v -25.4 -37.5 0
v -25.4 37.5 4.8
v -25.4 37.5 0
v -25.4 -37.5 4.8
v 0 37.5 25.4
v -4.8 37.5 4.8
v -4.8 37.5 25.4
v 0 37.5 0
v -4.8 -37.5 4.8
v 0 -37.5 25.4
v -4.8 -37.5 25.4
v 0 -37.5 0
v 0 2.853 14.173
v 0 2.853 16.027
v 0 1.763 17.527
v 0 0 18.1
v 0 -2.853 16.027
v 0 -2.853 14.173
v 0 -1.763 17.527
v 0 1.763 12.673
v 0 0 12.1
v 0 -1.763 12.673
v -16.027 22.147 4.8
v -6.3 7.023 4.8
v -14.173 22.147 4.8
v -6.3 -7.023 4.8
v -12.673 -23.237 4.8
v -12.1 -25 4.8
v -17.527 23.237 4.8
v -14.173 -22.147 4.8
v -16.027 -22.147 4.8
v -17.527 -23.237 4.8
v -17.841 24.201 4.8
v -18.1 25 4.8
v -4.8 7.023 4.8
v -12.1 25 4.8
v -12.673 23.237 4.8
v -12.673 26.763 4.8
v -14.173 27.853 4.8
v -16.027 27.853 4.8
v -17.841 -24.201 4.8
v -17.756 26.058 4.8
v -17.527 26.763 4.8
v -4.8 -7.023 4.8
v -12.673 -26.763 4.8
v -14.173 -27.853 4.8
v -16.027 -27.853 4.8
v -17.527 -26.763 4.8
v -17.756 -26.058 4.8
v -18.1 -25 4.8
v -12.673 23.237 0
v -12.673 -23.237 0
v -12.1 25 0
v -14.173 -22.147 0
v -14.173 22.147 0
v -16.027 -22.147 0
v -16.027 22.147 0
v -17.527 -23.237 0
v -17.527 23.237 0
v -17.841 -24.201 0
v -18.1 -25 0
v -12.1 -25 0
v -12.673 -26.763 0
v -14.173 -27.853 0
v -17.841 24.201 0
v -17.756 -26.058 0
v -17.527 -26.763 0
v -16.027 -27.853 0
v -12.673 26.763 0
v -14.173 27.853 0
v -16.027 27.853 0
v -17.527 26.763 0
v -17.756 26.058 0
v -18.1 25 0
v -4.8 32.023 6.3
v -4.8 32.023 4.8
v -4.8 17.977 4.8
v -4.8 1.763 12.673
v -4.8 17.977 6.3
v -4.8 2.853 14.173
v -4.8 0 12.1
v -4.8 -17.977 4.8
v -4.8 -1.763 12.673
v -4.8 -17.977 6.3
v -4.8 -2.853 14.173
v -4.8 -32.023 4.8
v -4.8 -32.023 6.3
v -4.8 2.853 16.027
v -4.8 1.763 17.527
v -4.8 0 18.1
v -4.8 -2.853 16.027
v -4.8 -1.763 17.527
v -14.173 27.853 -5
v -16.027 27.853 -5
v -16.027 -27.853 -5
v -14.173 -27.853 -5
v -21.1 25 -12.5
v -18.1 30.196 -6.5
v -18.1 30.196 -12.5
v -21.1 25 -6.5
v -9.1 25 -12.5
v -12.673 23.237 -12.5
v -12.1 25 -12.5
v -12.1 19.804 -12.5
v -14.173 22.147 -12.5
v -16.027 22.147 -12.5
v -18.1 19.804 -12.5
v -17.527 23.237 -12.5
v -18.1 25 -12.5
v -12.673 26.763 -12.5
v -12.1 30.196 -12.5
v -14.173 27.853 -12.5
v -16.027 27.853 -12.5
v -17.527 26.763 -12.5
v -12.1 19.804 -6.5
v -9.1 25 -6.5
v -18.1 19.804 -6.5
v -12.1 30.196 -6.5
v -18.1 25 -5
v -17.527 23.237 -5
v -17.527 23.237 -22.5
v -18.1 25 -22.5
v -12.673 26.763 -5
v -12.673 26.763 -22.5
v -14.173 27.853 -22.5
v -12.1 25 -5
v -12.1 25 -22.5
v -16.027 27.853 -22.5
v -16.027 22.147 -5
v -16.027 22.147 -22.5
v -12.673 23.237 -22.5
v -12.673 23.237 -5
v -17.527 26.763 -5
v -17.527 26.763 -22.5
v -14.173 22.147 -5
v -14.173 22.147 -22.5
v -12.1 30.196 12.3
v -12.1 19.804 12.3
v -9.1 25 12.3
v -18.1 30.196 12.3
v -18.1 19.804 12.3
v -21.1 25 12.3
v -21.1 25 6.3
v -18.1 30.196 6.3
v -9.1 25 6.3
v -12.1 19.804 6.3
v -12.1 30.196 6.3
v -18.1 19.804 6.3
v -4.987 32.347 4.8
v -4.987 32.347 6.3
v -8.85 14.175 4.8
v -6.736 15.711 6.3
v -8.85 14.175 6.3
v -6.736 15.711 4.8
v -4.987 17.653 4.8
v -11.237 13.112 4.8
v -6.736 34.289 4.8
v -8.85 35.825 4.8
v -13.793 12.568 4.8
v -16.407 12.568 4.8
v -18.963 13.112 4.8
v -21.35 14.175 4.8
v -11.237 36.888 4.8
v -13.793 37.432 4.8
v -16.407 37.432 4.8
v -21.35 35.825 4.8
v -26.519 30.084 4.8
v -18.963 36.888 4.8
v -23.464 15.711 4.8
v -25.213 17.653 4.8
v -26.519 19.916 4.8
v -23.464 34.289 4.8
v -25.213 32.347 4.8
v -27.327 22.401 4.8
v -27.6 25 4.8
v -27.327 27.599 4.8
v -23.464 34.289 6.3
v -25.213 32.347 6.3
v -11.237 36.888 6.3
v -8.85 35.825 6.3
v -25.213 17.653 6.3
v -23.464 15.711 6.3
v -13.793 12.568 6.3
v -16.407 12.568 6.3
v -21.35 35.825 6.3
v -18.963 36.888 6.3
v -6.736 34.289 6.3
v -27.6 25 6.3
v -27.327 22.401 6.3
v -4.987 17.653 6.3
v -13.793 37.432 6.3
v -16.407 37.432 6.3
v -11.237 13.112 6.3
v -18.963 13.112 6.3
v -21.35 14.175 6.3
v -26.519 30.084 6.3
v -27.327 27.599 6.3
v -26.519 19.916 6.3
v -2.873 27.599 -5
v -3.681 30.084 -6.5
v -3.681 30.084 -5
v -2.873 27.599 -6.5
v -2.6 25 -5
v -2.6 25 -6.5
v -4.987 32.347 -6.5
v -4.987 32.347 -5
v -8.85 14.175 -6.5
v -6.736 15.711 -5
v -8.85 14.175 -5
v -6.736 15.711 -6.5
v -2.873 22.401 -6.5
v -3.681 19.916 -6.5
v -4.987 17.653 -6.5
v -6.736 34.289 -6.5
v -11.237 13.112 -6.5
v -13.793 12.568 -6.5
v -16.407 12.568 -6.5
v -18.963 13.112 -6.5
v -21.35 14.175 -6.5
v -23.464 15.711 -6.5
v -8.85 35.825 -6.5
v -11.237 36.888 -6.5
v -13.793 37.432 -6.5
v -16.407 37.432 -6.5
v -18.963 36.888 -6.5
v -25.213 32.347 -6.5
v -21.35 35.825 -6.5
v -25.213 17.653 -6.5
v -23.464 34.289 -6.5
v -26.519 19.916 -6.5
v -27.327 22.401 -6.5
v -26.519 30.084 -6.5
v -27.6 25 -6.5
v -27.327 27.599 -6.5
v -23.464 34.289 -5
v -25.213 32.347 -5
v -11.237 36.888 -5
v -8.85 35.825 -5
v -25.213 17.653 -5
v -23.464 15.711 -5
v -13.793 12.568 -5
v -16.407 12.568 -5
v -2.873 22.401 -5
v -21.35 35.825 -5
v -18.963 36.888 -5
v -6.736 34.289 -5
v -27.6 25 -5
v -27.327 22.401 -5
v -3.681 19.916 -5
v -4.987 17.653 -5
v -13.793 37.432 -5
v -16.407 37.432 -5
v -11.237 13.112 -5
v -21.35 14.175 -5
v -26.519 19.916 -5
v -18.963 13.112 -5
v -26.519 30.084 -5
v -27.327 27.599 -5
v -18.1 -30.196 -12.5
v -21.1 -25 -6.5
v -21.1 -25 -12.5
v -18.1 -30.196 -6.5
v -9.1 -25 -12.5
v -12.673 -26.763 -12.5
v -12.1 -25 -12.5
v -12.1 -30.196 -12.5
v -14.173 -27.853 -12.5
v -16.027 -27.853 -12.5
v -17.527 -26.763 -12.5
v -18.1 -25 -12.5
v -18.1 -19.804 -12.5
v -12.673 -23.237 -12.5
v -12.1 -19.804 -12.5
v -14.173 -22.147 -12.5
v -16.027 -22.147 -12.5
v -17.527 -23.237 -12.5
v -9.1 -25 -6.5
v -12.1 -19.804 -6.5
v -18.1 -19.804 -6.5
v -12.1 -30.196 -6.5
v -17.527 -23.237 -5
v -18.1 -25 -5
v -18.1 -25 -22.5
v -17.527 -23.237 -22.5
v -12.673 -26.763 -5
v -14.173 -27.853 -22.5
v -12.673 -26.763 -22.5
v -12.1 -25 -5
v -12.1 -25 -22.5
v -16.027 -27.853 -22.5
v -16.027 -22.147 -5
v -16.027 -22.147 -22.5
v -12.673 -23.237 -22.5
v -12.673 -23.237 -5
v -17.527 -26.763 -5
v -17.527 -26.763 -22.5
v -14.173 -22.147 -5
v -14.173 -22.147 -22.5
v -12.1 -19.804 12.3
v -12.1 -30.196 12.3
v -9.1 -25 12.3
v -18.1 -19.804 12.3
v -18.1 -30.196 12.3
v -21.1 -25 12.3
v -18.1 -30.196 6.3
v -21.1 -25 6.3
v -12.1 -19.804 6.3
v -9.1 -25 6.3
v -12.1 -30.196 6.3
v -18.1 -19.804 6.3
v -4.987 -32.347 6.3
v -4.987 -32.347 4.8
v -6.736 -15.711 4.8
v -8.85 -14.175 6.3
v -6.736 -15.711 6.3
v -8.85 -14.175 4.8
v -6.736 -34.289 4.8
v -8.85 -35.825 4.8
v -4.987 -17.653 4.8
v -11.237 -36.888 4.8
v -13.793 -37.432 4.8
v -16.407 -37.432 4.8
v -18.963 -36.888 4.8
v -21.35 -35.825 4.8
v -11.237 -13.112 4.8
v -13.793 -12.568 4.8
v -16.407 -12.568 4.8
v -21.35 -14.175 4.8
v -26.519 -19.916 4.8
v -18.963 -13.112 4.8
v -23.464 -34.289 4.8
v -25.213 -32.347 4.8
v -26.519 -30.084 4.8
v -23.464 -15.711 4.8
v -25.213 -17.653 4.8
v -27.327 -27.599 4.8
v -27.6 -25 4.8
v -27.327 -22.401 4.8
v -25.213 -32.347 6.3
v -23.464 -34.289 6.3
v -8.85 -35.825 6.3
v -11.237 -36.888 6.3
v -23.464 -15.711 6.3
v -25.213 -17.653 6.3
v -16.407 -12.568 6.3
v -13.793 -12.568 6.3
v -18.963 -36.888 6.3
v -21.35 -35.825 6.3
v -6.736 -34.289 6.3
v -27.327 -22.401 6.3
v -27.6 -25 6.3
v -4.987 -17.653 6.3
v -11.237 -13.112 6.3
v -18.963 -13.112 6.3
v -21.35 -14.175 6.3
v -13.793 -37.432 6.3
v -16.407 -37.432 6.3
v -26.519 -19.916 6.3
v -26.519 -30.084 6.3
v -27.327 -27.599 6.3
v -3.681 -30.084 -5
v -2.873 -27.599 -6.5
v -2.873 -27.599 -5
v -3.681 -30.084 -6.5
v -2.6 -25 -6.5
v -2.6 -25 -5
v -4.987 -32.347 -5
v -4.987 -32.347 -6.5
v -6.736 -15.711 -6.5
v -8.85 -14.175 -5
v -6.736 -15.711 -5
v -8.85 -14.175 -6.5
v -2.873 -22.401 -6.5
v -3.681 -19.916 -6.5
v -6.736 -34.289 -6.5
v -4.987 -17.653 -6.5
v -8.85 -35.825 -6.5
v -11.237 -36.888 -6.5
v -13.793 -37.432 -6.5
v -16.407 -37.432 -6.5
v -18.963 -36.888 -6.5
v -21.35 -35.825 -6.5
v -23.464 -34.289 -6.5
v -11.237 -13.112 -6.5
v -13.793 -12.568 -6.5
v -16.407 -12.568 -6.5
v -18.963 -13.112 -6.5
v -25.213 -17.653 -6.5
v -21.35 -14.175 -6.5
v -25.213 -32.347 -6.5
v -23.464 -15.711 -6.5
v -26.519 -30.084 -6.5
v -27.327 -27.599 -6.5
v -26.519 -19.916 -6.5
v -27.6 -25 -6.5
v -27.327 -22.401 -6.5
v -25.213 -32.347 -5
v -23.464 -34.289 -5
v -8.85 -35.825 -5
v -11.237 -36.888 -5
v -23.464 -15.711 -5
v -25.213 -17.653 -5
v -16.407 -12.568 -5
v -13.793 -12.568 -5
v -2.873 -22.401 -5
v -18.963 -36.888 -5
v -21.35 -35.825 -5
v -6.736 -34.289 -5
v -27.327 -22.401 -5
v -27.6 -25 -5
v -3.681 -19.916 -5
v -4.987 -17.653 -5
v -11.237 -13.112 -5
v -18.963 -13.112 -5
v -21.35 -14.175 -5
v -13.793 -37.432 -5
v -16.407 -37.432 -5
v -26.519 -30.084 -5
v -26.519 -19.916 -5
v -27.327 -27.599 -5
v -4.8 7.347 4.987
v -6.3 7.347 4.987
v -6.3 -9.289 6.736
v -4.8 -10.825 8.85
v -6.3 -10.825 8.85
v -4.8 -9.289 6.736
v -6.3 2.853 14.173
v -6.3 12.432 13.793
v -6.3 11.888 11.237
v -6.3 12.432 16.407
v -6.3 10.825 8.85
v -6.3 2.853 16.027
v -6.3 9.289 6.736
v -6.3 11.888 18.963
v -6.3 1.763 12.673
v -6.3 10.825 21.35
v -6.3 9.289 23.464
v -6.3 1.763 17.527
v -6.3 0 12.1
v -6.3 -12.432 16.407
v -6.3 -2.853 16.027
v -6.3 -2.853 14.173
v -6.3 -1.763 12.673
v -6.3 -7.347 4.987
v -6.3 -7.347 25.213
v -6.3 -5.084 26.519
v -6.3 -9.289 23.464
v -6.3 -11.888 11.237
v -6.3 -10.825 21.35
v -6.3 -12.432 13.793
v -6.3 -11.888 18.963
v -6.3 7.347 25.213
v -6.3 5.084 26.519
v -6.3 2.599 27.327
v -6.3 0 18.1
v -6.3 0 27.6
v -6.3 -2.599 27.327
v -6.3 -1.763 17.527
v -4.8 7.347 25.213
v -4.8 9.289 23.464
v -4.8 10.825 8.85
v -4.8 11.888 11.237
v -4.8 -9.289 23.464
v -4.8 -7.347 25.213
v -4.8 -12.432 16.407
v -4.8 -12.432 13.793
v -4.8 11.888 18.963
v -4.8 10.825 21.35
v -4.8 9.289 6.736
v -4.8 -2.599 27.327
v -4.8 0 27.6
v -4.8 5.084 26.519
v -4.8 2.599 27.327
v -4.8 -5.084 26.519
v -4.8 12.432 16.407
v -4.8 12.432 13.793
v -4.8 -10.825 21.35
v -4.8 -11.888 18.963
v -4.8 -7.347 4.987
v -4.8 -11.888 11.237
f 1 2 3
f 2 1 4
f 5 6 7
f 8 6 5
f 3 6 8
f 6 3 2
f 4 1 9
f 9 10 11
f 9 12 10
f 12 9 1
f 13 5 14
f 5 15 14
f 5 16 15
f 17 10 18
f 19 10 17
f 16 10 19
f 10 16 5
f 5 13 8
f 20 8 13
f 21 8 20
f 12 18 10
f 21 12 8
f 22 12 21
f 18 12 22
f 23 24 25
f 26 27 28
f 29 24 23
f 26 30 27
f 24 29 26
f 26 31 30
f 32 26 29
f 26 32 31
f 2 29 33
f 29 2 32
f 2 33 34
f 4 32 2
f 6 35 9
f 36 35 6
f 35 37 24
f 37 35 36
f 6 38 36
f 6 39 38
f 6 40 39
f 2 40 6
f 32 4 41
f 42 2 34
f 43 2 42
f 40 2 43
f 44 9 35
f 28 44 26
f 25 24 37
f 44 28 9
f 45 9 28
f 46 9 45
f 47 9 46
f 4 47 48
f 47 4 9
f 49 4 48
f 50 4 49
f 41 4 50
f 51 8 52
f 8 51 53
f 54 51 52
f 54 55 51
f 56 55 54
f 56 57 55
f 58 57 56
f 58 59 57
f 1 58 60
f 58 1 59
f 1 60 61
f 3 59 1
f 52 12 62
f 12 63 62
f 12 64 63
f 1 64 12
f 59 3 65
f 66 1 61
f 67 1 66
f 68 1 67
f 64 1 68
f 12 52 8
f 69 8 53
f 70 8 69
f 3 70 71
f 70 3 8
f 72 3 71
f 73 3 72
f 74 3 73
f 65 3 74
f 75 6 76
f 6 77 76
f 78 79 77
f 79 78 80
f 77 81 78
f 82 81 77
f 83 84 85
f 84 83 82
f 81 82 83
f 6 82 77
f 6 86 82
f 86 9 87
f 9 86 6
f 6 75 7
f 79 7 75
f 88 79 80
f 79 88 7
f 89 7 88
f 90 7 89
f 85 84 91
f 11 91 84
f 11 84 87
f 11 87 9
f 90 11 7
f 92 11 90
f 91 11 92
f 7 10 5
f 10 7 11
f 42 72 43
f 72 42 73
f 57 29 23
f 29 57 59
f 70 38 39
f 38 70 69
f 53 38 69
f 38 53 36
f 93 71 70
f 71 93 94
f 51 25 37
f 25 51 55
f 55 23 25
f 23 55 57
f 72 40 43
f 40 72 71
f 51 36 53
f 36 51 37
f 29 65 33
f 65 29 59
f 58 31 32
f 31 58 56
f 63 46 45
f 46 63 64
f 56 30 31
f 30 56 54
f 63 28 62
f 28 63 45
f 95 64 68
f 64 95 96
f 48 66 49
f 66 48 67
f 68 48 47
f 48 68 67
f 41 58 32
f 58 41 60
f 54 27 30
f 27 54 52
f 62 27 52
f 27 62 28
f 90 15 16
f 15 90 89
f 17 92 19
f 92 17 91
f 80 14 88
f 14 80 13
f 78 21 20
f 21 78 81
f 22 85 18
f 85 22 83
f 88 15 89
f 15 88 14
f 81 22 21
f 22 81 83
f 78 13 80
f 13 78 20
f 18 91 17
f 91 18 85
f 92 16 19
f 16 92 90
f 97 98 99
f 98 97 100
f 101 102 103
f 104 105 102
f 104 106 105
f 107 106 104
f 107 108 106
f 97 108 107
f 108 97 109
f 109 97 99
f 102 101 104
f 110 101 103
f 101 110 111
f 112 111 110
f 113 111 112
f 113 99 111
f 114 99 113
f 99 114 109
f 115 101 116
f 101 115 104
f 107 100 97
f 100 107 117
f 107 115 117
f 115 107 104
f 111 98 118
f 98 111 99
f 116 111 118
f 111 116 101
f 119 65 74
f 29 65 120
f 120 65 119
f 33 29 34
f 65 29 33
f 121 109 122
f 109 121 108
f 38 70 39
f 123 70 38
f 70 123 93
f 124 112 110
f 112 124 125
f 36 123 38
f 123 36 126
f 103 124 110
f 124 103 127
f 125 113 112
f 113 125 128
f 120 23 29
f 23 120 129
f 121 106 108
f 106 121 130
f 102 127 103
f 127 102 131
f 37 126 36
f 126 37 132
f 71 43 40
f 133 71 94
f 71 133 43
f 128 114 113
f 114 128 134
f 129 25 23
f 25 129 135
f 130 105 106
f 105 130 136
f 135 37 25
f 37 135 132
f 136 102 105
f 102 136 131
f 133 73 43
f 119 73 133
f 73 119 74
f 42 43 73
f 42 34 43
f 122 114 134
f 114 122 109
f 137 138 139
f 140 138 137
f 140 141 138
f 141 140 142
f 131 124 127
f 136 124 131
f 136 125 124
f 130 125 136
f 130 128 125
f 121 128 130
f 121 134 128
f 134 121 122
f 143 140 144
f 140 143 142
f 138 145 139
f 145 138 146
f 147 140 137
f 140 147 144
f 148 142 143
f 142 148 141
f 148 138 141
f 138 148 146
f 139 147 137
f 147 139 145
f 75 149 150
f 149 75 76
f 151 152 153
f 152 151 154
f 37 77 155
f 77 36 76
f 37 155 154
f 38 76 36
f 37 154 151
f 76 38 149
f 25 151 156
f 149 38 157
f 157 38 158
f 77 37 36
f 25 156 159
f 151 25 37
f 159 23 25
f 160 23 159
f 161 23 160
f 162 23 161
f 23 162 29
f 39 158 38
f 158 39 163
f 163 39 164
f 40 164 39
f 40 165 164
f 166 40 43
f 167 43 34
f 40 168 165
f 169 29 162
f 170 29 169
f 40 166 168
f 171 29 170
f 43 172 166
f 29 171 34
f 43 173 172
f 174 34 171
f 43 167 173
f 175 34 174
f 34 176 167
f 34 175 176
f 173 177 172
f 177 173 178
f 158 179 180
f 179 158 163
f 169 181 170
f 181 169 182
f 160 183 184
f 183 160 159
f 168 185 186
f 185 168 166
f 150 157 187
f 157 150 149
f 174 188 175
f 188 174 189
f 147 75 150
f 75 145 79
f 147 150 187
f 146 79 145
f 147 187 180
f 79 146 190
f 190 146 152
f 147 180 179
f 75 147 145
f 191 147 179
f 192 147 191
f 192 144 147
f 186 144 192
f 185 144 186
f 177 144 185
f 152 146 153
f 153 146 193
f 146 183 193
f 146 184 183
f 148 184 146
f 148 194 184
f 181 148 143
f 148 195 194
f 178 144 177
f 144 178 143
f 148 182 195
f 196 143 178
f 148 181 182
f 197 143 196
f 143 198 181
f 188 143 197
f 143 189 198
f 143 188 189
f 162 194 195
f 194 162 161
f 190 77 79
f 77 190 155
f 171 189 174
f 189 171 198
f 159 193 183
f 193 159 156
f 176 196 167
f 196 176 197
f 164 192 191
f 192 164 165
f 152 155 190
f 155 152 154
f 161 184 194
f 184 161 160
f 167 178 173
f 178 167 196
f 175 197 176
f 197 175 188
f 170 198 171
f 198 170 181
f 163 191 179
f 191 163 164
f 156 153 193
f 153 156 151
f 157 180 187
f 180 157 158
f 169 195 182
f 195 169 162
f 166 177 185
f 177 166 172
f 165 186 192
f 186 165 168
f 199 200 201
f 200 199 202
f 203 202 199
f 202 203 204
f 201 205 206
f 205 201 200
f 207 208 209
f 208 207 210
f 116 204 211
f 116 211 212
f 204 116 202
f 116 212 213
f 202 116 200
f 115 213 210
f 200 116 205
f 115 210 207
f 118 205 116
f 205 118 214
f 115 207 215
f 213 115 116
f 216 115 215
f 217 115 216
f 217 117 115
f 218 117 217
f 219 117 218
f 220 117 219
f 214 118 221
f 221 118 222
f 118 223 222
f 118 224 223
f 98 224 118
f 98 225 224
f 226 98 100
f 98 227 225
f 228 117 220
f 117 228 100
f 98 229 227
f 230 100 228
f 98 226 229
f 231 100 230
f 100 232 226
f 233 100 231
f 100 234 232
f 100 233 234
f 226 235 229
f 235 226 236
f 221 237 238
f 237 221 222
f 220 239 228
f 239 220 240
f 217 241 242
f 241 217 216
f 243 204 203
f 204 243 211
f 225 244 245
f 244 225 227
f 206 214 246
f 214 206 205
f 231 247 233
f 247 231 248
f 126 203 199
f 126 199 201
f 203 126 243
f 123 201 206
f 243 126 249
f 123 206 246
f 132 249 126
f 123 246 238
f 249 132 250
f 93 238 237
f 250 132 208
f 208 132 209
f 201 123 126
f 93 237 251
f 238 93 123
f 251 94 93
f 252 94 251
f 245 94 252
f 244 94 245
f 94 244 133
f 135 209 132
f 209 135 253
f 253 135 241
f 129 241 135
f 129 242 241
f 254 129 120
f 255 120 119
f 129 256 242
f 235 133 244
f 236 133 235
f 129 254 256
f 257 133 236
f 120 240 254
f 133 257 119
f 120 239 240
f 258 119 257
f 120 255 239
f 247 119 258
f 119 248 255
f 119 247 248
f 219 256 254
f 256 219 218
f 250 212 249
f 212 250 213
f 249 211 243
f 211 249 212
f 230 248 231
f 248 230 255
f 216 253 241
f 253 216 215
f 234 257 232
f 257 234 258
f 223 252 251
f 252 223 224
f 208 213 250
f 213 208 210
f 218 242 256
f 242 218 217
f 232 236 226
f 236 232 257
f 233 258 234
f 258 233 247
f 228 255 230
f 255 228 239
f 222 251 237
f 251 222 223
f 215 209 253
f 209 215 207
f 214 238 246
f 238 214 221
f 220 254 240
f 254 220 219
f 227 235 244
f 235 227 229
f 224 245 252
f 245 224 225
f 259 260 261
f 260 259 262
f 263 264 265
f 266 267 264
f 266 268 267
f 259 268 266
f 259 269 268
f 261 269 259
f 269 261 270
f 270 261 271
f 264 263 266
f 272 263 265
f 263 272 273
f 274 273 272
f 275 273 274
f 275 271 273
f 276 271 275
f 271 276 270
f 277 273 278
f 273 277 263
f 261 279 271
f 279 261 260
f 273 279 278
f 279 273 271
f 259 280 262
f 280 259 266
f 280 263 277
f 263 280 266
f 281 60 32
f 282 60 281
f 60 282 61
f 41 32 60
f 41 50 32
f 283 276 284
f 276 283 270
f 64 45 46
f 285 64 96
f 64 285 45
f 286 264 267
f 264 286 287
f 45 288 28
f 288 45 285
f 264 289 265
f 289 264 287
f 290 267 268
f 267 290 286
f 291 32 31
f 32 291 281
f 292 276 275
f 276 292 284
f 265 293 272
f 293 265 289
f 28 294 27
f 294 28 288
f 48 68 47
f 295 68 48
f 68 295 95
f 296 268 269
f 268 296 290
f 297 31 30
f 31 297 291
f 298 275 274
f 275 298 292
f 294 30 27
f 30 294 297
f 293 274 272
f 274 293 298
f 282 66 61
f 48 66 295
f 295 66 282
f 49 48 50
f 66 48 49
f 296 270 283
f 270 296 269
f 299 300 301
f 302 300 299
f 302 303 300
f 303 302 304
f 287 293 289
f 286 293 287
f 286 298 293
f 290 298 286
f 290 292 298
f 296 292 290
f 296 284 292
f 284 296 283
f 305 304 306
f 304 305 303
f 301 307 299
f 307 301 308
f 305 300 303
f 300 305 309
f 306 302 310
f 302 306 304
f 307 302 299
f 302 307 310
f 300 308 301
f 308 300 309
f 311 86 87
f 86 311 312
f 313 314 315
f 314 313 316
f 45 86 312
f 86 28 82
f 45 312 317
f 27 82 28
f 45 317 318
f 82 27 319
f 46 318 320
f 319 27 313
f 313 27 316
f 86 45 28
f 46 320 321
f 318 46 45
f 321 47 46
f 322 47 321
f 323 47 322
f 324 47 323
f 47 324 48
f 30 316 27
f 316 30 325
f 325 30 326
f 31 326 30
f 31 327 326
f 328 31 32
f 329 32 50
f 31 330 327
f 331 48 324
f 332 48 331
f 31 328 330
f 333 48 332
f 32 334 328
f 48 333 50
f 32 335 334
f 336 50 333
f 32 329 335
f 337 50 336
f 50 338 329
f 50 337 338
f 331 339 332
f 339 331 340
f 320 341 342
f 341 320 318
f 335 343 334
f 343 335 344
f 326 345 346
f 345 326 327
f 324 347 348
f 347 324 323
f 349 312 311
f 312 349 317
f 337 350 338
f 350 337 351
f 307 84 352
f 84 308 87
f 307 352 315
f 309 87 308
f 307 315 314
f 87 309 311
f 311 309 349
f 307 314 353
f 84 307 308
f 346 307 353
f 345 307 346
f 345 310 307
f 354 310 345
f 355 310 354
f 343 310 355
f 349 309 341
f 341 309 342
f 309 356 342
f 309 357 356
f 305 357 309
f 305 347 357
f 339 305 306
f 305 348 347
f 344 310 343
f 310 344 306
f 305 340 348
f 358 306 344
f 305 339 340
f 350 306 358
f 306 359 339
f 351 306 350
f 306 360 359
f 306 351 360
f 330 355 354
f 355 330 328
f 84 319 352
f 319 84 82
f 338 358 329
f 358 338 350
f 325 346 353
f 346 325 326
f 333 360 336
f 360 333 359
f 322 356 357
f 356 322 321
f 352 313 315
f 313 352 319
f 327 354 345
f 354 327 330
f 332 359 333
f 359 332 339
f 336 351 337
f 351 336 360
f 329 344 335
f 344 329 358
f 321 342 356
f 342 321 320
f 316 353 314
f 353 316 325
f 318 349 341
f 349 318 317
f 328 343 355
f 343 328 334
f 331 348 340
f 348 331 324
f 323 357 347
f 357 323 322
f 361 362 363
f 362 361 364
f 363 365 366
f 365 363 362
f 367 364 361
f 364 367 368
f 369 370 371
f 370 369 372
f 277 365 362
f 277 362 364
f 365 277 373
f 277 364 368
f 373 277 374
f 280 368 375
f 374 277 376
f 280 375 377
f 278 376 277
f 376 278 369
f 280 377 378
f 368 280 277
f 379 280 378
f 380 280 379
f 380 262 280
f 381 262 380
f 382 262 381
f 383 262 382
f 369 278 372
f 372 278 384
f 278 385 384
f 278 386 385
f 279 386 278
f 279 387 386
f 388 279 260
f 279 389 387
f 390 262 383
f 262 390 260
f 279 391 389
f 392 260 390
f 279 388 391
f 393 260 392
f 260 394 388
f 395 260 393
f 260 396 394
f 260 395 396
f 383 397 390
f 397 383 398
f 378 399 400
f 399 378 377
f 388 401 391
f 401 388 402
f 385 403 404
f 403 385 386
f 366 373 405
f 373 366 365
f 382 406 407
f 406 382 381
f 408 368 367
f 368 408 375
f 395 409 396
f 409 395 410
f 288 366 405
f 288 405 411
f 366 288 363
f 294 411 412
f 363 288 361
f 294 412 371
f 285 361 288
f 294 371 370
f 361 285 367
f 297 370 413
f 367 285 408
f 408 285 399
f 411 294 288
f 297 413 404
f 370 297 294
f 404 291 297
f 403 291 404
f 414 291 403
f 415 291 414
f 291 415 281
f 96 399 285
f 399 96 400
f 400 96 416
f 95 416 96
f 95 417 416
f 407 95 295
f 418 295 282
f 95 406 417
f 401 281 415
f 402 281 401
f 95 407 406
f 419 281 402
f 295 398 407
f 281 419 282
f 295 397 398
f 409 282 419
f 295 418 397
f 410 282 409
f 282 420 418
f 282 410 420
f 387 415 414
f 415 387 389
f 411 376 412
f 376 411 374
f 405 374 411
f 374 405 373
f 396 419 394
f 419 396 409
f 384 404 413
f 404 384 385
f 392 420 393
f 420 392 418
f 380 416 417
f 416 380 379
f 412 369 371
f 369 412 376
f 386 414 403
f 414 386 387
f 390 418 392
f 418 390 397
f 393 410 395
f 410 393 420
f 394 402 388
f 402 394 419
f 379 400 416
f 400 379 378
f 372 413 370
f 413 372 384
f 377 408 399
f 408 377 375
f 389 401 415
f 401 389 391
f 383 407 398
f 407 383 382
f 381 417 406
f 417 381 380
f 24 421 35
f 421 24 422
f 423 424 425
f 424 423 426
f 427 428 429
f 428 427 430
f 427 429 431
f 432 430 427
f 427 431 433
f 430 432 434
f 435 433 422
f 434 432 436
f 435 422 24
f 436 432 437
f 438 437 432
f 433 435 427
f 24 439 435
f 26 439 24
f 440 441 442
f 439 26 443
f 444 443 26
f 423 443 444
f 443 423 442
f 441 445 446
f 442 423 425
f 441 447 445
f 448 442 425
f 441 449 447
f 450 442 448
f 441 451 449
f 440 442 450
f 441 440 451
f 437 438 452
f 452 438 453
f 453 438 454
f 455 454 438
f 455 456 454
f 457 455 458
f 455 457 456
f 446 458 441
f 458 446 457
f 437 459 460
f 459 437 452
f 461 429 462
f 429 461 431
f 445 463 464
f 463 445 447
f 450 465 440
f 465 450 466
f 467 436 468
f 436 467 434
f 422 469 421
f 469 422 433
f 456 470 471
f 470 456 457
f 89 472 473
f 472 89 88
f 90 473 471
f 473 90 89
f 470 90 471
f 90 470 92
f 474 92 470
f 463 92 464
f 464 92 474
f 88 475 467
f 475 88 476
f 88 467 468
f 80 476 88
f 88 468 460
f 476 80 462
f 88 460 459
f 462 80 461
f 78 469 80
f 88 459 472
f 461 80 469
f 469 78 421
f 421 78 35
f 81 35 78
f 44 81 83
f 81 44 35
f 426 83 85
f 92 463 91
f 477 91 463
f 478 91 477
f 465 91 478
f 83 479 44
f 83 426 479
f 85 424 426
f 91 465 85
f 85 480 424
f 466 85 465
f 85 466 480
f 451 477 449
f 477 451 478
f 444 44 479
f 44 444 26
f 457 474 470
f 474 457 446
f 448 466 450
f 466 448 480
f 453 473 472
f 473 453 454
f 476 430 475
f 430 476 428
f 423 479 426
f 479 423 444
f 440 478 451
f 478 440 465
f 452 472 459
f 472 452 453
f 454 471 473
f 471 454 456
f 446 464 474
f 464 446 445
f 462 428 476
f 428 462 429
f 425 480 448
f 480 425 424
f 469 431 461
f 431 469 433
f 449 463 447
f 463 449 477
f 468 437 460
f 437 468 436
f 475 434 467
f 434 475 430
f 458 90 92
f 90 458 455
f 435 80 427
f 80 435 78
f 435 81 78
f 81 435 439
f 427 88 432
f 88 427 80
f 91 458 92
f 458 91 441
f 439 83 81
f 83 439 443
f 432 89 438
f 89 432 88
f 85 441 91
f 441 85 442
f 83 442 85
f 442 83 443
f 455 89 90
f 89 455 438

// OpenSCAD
// file: ../common/metric_nut.scad
// include <../../config.scad>;
use <./beam_hexagonal.scad>;
use <./metric_bolt_functions.scad>;

module metric_nut(size, centre = true) {
    height = get_metric_bolt_head_height(size);
    diameter = get_metric_bolt_head_diameter(size);
    radius = diameter / 2;
    color("gray") difference() {
        // body
        beam_hexagonal(height, diameter, centre = centre, suppress_shopping_outputs = true);
        // hole
        cylinder(height, size / 2, size / 2, center = centre);
    }
    // Shopping
    echo(str("Nut: Nut M", size, " - x1"));
}

// $fn = 200;
metric_nut(12);
// file: ../common/beam_hexagonal.scad
// include <../../config.scad>;

module beam_hexagonal(L, d, centre = true, suppress_shopping_outputs = false) {
    radius = d / 2;
    linear_extrude(L, center = centre) polygon([[radius, 0], [radius * cos(60), radius * sin(60)], [radius * cos(120), radius * sin(120)], [radius * cos(180), radius * sin(180)], [radius * cos(240), radius * sin(240)], [radius * cos(300), radius * sin(300)]]);
    // Shopping
    if (!suppress_shopping_outputs) {
        echo(str("Hexagonal beam: Hexagonal beam Φ", d, "mm x ", L, "mm - x1"));
    }
}

// $fn = 200;
beam_hexagonal(500, 50);
// file: ../fixings/tube_clamp_square_base_plate_132_functions.scad
function get_L_shaft_with_base_plate_square_base_plate_132(beam_width) = 
    // (beam_width == 40) ?
    75
;
function get_R_plate_square_base_plate_132(beam_width) = 
    // (beam_width == 40) ?
    [143, 75, 18.5]
;
function get_thickness_square_base_plate_132(beam_width) = 
    // (beam_width == 40) ?
    8
;
function get_offset_hole_x_square_base_plate_132(beam_width) = 
    // (beam_width == 40) ?
    100 / 2
;
function get_diameter_hole_square_base_plate_132(beam_width) = 
    // (beam_width == 40) ?
    10
;
// file: ../fixings/tube_clamp_round_base_plate_132_functions.scad
function get_L_shaft_with_base_plate_round_base_plate_132(tube_diameter) = 
    (tube_diameter == 27) ? 
        85
    : (tube_diameter == 42) ?
        122
    : 25
;
function get_R_plate_round_base_plate_132(tube_diameter) = 
    (tube_diameter == 27) ? 
        [64, 114, 7]
    : (tube_diameter == 42) ?
        [80, 140, 10]
    : [10, 20, 1]
;
function get_offset_hole_y_round_base_plate_132(tube_diameter) = 
    (tube_diameter == 27) ? 
        38
    : (tube_diameter == 42) ?
        50
    : 10
;
function get_diameter_hole_round_base_plate_132(tube_diameter) = 10;
// file: ../fixings/tube_clamp_round_3_way_through_116_functions.scad
function  get_L_shaft_long_round_3_way_through_116(tube_diameter) = 
    (tube_diameter == 27) ? 
        42
    : (tube_diameter == 42) ?
        60
    : 25
;
function get_thickness_round_3_way_through_116(tube_diameter) = 7;
function get_L_shaft_short_round_3_way_through_116(tube_diameter) = tube_diameter + 2 * get_thickness_round_3_way_through_116();
// file: ../fixings/tube_clamp_round_tee_long_104_functions.scad
// include <../../config.scad>;

function get_L_shaft_long_round_tee_long_104(tube_diameter) = 
    (tube_diameter == 27) ? 
        85
    : (tube_diameter == 42) ?
        122
    : 25
;
function get_L_shaft_short_round_tee_long_104(tube_diameter) = 
    (tube_diameter == 27) ? 
        42
    : (tube_diameter == 42) ?
        61
    : 10
;
// file: brake_assembly_functions.scad
// include <../../config.scad>; // circular reference!

function get_y_pos_lead_fixing_ballscrew_to_brake_arms(angle_brake_rod, y_pos_axle_rear, x_pos_axle_leg_rear, x_offset_fixing_brake_arm_to_lead_plate) = y_pos_axle_rear + (x_pos_axle_leg_rear - x_offset_fixing_brake_arm_to_lead_plate) / tan(angle_brake_rod); // (X_POS_AXLE_LEG_REAR - X_OFFSET_FIXING_BRAKE_ARM_TO_LEAD_PLATE)
// file: ../common/washer.scad
include <../../config.scad>;

module washer(t, d_outer, d_inner, centre = true) {
    r_outer = d_outer / 2;
    r_inner = d_inner / 2;
    color("silver") difference() {
        cylinder(t, r_outer, r_outer, center = centre);
        cylinder(t, r_inner, r_inner, center = centre);
    }
    // Shopping
    echo(str("Washer: Washer Φ", d_outer, "mm x ", d_inner, "mm x ", t, "mm - x1"));
}

// $fn = 200;
washer(3, 10, 40);
// file: ../common/metric_bolt_functions.scad
function get_metric_bolt_head_height(size) = size;
function get_metric_bolt_head_diameter(size) = size * 2;
function get_metric_bolt_washer_diameter_safe_working_clearance(size) = 
    (size < 20) ?
        4 * size
    :
        3 * size
;
// file: ../common/metric_bolt.scad
// include <../../config.scad>;
use <./beam_hexagonal.scad>;
use <./metric_bolt_functions.scad>;
use <./metric_nut.scad>;

module metric_bolt(size, length, has_nut = true, offset_nut_from_end = 0) {
    echo("Metric bolt assembly:");
    head_height = get_metric_bolt_head_height(size);
    head_diameter = get_metric_bolt_head_diameter(size);
    head_radius = head_diameter / 2;
    color("gray") union() {
        // Stem
        cylinder(length, size / 2, size / 2, center = true);
        // Head
        translate([0, 0, length / 2 - size / 2]) beam_hexagonal(head_height, head_diameter, centre = true, suppress_shopping_outputs = true);
        if (has_nut) {
            // Nut
            translate([0, 0, -(length / 2 - size / 2) + offset_nut_from_end]) metric_nut(size);
        }
    }
    // Shopping
    echo(str("Bolt: Bolt M", size, " x ", length, "mm - x1"));
}

// $fn = 200;
metric_bolt(12, 100);
translate([30, 0, 0]) metric_bolt(12, 100, false);
translate([60, 0, 0]) metric_bolt(12, 100, true, 5);
// file: ../common/angle_beam.scad
module angle_beam(L, w, t, centre = true) {
    R_offset_centre = [-w / 2, -w / 2, -L / 2];
    translate(centre ? R_offset_centre : [0, 0, 0]) union() {
        cube([w, t, L], center = false);
        cube([t, w, L], center = false);
    }
    // Shopping
    echo(str("Rectangular Aluminium angle beam: Rectangular Aluminium angle beam ", L, "mm x ", w, "mm x ", t, "mm - x1"));
    // https://www.metals4u.co.uk/materials/aluminium/aluminium-angle/aa25-4x25-4x4-8-p
}

angle_beam(500, 50, 5);
// main file
include <../../config.scad>;
use <../common/angle_beam.scad>;
use <../common/metric_bolt.scad>;
use <../common/metric_bolt_functions.scad>;
use <../common/washer.scad>;


module fixing_brake_arm_to_brake_pad() {
    echo("Fixing brake arm to brake pad:");
    h_head_fastener = get_metric_bolt_head_height(SIZE_BOLT_FIXING_BRAKE_ARM_TO_BRAKE_PAD);
    L_fastener = 2 * (h_head_fastener + T_WASHER_BOLT_FIXING_BRAKE_ARM_TO_BRAKE_PAD) + R_BRAKE_ARM[2] + T_FIXING_BRAKE_ARM_TO_BRAKE_PAD + L_BOLT_EXTENSION;
    union() {
        // fixing
        color(COLOUR_BEAM_ALUMINIUM) difference() {
            // body
            rotate([90, 0, 180]) translate([0, 0, -L_FIXING_BRAKE_ARM_TO_BRAKE_PAD / 2]) angle_beam(L_FIXING_BRAKE_ARM_TO_BRAKE_PAD, W_FIXING_BRAKE_ARM_TO_BRAKE_PAD, T_FIXING_BRAKE_ARM_TO_BRAKE_PAD, false);
            // brake pad fastener hole
            translate([0, 0, T_FIXING_BRAKE_ARM_TO_BRAKE_PAD + (W_FIXING_BRAKE_ARM_TO_BRAKE_PAD - T_FIXING_BRAKE_ARM_TO_BRAKE_PAD) / 2]) rotate([0, 90, 0]) cylinder(W_FIXING_BRAKE_ARM_TO_BRAKE_PAD * 2, SIZE_BOLT_FIXING_BRAKE_ARM_TO_BRAKE_PAD / 2, SIZE_BOLT_FIXING_BRAKE_ARM_TO_BRAKE_PAD / 2, center = true);
            // brake arm fastener holes
            for (index_side_y = [0:1:1]) {
                mirror([0, index_side_y, 0]) {
                    translate([-T_FIXING_BRAKE_ARM_TO_BRAKE_PAD - (W_FIXING_BRAKE_ARM_TO_BRAKE_PAD - T_FIXING_BRAKE_ARM_TO_BRAKE_PAD) / 2, D_WASHER_BOLT_FIXING_BRAKE_ARM_TO_BRAKE_PAD, 0]) cylinder(W_FIXING_BRAKE_ARM_TO_BRAKE_PAD * 2, SIZE_BOLT_FIXING_BRAKE_ARM_TO_BRAKE_PAD / 2, SIZE_BOLT_FIXING_BRAKE_ARM_TO_BRAKE_PAD / 2, center = true);
                }
            }
        }
        // fasteners to brake arm
        for (index_side_y = [0:1:1]) {
            mirror([0, index_side_y, 0]) {
                translate([-T_FIXING_BRAKE_ARM_TO_BRAKE_PAD - (W_FIXING_BRAKE_ARM_TO_BRAKE_PAD - T_FIXING_BRAKE_ARM_TO_BRAKE_PAD) / 2, D_WASHER_BOLT_FIXING_BRAKE_ARM_TO_BRAKE_PAD, 0]) {
                    // bolt
                    translate([0, 0, -L_fastener / 2 + T_FIXING_BRAKE_ARM_TO_BRAKE_PAD + T_WASHER_BOLT_FIXING_BRAKE_ARM_TO_BRAKE_PAD + h_head_fastener]) metric_bolt(SIZE_BOLT_FIXING_BRAKE_ARM_TO_BRAKE_PAD, L_fastener, true, L_BOLT_EXTENSION);
                    // washers
                    // upper
                    translate([0, 0, T_WASHER_BOLT_FIXING_BRAKE_ARM_TO_BRAKE_PAD / 2 + T_FIXING_BRAKE_ARM_TO_BRAKE_PAD]) washer(T_WASHER_BOLT_FIXING_BRAKE_ARM_TO_BRAKE_PAD, D_WASHER_BOLT_FIXING_BRAKE_ARM_TO_BRAKE_PAD, SIZE_BOLT_FIXING_BRAKE_ARM_TO_BRAKE_PAD);
                    // lower
                    translate([0, 0, -T_WASHER_BOLT_FIXING_BRAKE_ARM_TO_BRAKE_PAD / 2 - R_BRAKE_ARM[2]]) washer(T_WASHER_BOLT_FIXING_BRAKE_ARM_TO_BRAKE_PAD, D_WASHER_BOLT_FIXING_BRAKE_ARM_TO_BRAKE_PAD, SIZE_BOLT_FIXING_BRAKE_ARM_TO_BRAKE_PAD);
                }
            }
        }
        // fastener to brake pad
        // washer
        translate([-T_FIXING_BRAKE_ARM_TO_BRAKE_PAD - T_WASHER_BOLT_FIXING_BRAKE_ARM_TO_BRAKE_PAD / 2, 0, T_FIXING_BRAKE_ARM_TO_BRAKE_PAD + (W_FIXING_BRAKE_ARM_TO_BRAKE_PAD - T_FIXING_BRAKE_ARM_TO_BRAKE_PAD) / 2]) rotate([0, 90, 0]) washer(T_WASHER_BOLT_FIXING_BRAKE_ARM_TO_BRAKE_PAD, D_WASHER_BOLT_FIXING_BRAKE_ARM_TO_BRAKE_PAD, SIZE_BOLT_FIXING_BRAKE_ARM_TO_BRAKE_PAD);
    }
    // Shopping
    // Angle beam
    // Fasteners
    // Washers
}

fixing_brake_arm_to_brake_pad();
